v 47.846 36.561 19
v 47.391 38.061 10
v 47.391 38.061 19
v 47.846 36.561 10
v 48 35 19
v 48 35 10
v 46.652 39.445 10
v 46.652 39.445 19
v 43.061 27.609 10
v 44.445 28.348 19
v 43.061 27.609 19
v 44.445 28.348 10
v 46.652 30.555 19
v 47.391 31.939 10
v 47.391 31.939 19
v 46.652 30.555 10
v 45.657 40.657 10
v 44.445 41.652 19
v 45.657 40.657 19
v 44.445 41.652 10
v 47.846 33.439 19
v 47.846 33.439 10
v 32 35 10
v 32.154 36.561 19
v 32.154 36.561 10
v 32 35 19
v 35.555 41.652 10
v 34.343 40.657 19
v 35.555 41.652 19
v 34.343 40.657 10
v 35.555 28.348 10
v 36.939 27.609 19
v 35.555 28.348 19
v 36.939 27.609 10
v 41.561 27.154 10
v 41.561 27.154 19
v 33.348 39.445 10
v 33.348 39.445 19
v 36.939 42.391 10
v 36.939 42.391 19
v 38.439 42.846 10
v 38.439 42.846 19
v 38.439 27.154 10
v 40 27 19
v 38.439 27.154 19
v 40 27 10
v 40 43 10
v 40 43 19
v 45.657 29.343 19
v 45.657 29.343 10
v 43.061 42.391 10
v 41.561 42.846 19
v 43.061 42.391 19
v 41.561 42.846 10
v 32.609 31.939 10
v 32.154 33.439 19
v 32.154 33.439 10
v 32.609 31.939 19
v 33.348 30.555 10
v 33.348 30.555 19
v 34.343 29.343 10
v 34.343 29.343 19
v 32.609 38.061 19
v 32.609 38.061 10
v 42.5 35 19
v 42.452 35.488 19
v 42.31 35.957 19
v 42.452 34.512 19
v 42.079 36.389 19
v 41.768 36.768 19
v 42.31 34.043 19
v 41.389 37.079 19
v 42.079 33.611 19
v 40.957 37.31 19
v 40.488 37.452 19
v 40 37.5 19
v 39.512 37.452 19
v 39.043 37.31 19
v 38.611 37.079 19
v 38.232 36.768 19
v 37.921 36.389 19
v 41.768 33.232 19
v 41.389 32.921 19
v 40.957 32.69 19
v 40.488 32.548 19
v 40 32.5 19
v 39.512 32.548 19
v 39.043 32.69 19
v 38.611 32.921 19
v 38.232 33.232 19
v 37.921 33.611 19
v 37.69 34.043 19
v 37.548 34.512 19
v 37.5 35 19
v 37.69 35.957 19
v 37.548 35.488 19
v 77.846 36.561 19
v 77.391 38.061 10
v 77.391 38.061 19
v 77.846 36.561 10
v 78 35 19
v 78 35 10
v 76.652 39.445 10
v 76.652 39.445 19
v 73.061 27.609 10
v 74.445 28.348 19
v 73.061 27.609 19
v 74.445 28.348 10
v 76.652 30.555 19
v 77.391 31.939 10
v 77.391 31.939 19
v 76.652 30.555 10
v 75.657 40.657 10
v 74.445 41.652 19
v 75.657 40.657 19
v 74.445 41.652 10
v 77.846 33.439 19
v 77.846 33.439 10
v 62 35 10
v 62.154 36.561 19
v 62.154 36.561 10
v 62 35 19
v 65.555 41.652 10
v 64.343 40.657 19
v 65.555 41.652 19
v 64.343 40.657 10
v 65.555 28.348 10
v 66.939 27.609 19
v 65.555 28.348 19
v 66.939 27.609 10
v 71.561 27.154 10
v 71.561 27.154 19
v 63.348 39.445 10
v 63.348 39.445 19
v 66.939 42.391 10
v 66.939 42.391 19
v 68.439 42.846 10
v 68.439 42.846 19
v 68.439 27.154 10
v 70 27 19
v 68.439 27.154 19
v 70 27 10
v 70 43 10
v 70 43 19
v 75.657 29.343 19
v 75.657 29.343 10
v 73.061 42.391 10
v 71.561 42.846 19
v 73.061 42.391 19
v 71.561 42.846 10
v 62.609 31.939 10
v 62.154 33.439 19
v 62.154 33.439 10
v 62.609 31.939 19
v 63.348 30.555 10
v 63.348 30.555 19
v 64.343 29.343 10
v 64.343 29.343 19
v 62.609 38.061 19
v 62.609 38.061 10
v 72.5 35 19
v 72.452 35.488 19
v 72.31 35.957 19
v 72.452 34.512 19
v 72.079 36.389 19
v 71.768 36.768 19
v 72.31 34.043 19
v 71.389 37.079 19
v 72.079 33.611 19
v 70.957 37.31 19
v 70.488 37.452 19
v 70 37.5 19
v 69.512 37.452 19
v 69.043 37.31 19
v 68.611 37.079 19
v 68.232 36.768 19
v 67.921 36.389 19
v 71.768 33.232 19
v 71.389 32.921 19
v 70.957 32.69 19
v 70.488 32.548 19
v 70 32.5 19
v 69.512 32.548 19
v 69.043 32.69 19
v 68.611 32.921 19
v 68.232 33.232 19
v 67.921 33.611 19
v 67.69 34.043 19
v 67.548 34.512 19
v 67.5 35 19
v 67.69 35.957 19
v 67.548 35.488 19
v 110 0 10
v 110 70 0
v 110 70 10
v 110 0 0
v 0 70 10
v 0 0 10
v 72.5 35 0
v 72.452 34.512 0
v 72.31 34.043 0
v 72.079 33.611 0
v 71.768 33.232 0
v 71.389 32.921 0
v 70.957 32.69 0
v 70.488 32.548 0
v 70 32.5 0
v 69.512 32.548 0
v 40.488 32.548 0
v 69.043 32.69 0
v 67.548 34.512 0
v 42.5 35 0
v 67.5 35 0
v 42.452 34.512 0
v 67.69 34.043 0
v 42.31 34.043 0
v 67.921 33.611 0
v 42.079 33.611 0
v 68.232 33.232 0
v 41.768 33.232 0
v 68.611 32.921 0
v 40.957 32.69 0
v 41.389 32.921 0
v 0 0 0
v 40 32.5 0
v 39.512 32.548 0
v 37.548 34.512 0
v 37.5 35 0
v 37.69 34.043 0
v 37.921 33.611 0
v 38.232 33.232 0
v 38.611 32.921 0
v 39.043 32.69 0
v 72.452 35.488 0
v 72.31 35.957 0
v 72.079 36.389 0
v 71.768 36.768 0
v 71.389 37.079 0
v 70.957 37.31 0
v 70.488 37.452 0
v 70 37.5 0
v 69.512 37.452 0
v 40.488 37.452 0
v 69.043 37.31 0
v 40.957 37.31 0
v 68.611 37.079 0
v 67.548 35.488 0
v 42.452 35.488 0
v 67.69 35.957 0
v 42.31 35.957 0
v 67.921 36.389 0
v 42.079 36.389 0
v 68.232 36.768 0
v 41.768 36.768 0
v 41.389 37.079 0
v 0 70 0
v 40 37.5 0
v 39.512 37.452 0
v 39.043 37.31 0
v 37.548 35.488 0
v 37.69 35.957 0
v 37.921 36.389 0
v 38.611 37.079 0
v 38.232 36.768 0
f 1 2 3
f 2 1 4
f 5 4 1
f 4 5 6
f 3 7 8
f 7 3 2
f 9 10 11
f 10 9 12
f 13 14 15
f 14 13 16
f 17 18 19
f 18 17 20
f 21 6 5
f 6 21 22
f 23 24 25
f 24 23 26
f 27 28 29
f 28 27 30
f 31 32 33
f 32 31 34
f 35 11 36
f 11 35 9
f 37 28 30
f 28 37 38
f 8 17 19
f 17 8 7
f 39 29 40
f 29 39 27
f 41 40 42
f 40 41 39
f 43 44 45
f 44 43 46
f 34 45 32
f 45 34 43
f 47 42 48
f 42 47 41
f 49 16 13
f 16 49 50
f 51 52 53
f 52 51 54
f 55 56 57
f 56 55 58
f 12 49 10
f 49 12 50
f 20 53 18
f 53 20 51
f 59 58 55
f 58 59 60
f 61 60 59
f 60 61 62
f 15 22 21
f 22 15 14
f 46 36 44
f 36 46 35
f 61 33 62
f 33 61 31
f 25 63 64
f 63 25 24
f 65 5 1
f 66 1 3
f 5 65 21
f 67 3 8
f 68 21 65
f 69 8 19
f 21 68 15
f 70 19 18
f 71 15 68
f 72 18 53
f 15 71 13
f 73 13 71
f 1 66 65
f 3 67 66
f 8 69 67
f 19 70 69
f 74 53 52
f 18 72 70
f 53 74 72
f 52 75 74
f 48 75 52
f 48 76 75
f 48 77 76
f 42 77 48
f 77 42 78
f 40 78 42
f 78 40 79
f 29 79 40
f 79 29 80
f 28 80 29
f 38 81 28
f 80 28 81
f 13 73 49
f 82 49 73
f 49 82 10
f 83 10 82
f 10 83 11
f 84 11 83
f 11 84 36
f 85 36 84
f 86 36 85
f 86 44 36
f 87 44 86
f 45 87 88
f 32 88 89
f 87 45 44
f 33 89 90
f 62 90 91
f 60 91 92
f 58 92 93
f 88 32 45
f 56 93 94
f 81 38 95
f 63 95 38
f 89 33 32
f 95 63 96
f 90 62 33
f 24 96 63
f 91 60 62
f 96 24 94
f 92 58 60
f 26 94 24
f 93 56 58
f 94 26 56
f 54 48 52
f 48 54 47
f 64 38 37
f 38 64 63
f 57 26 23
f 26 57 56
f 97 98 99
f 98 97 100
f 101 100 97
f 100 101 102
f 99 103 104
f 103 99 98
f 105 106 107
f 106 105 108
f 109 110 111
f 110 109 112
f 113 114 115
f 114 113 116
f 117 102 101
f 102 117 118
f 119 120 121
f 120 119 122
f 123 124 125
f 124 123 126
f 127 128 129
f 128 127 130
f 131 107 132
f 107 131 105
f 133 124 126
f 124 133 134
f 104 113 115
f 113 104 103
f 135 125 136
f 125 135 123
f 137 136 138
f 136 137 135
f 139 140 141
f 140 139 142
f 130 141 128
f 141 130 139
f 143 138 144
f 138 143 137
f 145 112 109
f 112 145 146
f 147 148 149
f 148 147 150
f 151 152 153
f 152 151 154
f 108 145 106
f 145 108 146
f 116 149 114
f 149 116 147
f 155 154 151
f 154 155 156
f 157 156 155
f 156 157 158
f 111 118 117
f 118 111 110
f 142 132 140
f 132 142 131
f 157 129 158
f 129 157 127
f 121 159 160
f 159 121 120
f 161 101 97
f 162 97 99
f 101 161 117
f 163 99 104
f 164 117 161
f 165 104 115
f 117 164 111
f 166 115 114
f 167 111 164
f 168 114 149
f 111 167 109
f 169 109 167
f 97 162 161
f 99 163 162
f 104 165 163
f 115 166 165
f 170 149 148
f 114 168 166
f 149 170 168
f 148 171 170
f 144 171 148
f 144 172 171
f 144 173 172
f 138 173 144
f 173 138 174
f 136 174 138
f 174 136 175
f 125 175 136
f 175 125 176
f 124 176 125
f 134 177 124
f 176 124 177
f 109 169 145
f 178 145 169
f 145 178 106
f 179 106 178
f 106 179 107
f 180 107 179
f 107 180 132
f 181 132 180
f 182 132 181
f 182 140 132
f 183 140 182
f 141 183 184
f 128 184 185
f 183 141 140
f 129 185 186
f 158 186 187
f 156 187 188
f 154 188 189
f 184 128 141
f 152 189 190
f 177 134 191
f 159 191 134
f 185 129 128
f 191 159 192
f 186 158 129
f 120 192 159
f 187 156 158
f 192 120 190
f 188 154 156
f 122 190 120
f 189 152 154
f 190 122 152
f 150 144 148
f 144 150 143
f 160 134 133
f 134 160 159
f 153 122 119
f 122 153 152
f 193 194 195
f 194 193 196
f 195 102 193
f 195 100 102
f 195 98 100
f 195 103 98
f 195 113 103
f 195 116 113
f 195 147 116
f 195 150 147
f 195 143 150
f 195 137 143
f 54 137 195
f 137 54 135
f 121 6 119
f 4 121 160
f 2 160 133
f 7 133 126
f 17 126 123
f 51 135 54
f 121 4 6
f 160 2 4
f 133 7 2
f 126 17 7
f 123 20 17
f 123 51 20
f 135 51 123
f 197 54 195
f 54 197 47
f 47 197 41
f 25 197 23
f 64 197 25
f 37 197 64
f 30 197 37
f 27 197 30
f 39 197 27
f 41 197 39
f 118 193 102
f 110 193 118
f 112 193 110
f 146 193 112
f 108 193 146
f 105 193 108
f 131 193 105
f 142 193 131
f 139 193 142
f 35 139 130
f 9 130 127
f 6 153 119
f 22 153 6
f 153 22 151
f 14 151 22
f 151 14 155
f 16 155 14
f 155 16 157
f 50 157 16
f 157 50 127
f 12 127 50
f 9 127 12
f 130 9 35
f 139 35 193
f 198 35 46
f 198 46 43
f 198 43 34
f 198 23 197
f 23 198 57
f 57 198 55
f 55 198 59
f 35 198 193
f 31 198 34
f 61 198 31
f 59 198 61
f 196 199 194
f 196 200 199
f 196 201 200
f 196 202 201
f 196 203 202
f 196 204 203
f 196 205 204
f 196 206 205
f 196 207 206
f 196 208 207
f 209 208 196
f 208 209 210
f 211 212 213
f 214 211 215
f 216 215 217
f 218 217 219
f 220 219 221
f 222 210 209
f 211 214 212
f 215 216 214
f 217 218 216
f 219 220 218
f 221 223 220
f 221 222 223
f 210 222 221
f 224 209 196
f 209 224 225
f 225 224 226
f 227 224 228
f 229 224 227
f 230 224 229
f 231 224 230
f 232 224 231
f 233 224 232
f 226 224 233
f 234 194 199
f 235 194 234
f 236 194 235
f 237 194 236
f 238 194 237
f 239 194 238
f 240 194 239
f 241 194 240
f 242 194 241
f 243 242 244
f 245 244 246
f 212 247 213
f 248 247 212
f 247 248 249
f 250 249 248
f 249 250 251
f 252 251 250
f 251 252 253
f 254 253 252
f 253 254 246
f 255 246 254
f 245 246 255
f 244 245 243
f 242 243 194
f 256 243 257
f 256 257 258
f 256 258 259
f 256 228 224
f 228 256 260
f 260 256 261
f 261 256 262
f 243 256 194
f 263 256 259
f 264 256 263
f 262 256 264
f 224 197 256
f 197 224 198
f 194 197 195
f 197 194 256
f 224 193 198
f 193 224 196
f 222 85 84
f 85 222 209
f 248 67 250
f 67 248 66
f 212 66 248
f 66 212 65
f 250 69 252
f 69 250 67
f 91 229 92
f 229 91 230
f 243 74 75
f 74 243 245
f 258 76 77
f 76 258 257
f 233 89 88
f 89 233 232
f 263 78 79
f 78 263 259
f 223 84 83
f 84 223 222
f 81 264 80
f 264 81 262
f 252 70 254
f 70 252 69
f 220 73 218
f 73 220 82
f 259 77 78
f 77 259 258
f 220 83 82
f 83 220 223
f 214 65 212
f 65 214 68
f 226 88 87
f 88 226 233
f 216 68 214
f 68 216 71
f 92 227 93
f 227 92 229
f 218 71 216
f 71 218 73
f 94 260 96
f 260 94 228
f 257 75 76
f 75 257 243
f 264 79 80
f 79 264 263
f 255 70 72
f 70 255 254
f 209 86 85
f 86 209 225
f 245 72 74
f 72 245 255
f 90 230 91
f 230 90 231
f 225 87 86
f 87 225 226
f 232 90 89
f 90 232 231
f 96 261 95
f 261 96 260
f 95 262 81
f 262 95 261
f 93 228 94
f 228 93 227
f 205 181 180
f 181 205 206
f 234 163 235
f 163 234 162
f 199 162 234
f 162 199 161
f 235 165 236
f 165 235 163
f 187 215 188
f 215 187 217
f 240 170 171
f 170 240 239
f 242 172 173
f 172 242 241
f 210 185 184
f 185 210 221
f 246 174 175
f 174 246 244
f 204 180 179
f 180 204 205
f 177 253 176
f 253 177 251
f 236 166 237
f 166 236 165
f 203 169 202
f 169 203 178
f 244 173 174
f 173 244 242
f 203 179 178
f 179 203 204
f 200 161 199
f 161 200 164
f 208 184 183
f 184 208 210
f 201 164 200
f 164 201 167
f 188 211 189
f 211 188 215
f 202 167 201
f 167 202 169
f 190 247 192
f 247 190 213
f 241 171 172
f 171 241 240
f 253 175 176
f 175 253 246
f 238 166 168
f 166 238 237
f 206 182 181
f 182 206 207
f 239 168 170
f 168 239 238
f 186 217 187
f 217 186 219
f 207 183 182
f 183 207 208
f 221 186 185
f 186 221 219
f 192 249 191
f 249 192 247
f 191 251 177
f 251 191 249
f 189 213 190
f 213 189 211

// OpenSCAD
$fn = 32;

// ----------------------------------------------------------------------
// Drill jig: two_boss jig
// ----------------------------------------------------------------------

// --- parameters (mm) ---
plate_l = 110;            // plate length, X
plate_w = 70;             // plate width, Y
plate_t = 10;             // plate thickness
boss_d = 16;              // guide boss diameter
boss_h = 10;              // boss height above the plate
guide_d = 5;              // guide hole diameter
boss_pitch = 30;          // boss pitch

n_boss = 2;  // guide bosses
boss_x0 = (plate_l - (n_boss - 1) * boss_pitch) / 2;  // first boss X
boss_top = plate_t - 1 + boss_h;  // boss crown height
total_h = boss_top;  // overall height

difference() {
  union() {
  cube([plate_l, plate_w, plate_t]);
  for (i = [0 : n_boss - 1])
    translate([boss_x0 + i * boss_pitch, plate_w / 2, plate_t - 1])
      cylinder(h = boss_h, d = boss_d);
  }
  for (i = [0 : n_boss - 1])
    translate([boss_x0 + i * boss_pitch, plate_w / 2, -1])
      cylinder(h = plate_t + boss_h, d = guide_d);
}
